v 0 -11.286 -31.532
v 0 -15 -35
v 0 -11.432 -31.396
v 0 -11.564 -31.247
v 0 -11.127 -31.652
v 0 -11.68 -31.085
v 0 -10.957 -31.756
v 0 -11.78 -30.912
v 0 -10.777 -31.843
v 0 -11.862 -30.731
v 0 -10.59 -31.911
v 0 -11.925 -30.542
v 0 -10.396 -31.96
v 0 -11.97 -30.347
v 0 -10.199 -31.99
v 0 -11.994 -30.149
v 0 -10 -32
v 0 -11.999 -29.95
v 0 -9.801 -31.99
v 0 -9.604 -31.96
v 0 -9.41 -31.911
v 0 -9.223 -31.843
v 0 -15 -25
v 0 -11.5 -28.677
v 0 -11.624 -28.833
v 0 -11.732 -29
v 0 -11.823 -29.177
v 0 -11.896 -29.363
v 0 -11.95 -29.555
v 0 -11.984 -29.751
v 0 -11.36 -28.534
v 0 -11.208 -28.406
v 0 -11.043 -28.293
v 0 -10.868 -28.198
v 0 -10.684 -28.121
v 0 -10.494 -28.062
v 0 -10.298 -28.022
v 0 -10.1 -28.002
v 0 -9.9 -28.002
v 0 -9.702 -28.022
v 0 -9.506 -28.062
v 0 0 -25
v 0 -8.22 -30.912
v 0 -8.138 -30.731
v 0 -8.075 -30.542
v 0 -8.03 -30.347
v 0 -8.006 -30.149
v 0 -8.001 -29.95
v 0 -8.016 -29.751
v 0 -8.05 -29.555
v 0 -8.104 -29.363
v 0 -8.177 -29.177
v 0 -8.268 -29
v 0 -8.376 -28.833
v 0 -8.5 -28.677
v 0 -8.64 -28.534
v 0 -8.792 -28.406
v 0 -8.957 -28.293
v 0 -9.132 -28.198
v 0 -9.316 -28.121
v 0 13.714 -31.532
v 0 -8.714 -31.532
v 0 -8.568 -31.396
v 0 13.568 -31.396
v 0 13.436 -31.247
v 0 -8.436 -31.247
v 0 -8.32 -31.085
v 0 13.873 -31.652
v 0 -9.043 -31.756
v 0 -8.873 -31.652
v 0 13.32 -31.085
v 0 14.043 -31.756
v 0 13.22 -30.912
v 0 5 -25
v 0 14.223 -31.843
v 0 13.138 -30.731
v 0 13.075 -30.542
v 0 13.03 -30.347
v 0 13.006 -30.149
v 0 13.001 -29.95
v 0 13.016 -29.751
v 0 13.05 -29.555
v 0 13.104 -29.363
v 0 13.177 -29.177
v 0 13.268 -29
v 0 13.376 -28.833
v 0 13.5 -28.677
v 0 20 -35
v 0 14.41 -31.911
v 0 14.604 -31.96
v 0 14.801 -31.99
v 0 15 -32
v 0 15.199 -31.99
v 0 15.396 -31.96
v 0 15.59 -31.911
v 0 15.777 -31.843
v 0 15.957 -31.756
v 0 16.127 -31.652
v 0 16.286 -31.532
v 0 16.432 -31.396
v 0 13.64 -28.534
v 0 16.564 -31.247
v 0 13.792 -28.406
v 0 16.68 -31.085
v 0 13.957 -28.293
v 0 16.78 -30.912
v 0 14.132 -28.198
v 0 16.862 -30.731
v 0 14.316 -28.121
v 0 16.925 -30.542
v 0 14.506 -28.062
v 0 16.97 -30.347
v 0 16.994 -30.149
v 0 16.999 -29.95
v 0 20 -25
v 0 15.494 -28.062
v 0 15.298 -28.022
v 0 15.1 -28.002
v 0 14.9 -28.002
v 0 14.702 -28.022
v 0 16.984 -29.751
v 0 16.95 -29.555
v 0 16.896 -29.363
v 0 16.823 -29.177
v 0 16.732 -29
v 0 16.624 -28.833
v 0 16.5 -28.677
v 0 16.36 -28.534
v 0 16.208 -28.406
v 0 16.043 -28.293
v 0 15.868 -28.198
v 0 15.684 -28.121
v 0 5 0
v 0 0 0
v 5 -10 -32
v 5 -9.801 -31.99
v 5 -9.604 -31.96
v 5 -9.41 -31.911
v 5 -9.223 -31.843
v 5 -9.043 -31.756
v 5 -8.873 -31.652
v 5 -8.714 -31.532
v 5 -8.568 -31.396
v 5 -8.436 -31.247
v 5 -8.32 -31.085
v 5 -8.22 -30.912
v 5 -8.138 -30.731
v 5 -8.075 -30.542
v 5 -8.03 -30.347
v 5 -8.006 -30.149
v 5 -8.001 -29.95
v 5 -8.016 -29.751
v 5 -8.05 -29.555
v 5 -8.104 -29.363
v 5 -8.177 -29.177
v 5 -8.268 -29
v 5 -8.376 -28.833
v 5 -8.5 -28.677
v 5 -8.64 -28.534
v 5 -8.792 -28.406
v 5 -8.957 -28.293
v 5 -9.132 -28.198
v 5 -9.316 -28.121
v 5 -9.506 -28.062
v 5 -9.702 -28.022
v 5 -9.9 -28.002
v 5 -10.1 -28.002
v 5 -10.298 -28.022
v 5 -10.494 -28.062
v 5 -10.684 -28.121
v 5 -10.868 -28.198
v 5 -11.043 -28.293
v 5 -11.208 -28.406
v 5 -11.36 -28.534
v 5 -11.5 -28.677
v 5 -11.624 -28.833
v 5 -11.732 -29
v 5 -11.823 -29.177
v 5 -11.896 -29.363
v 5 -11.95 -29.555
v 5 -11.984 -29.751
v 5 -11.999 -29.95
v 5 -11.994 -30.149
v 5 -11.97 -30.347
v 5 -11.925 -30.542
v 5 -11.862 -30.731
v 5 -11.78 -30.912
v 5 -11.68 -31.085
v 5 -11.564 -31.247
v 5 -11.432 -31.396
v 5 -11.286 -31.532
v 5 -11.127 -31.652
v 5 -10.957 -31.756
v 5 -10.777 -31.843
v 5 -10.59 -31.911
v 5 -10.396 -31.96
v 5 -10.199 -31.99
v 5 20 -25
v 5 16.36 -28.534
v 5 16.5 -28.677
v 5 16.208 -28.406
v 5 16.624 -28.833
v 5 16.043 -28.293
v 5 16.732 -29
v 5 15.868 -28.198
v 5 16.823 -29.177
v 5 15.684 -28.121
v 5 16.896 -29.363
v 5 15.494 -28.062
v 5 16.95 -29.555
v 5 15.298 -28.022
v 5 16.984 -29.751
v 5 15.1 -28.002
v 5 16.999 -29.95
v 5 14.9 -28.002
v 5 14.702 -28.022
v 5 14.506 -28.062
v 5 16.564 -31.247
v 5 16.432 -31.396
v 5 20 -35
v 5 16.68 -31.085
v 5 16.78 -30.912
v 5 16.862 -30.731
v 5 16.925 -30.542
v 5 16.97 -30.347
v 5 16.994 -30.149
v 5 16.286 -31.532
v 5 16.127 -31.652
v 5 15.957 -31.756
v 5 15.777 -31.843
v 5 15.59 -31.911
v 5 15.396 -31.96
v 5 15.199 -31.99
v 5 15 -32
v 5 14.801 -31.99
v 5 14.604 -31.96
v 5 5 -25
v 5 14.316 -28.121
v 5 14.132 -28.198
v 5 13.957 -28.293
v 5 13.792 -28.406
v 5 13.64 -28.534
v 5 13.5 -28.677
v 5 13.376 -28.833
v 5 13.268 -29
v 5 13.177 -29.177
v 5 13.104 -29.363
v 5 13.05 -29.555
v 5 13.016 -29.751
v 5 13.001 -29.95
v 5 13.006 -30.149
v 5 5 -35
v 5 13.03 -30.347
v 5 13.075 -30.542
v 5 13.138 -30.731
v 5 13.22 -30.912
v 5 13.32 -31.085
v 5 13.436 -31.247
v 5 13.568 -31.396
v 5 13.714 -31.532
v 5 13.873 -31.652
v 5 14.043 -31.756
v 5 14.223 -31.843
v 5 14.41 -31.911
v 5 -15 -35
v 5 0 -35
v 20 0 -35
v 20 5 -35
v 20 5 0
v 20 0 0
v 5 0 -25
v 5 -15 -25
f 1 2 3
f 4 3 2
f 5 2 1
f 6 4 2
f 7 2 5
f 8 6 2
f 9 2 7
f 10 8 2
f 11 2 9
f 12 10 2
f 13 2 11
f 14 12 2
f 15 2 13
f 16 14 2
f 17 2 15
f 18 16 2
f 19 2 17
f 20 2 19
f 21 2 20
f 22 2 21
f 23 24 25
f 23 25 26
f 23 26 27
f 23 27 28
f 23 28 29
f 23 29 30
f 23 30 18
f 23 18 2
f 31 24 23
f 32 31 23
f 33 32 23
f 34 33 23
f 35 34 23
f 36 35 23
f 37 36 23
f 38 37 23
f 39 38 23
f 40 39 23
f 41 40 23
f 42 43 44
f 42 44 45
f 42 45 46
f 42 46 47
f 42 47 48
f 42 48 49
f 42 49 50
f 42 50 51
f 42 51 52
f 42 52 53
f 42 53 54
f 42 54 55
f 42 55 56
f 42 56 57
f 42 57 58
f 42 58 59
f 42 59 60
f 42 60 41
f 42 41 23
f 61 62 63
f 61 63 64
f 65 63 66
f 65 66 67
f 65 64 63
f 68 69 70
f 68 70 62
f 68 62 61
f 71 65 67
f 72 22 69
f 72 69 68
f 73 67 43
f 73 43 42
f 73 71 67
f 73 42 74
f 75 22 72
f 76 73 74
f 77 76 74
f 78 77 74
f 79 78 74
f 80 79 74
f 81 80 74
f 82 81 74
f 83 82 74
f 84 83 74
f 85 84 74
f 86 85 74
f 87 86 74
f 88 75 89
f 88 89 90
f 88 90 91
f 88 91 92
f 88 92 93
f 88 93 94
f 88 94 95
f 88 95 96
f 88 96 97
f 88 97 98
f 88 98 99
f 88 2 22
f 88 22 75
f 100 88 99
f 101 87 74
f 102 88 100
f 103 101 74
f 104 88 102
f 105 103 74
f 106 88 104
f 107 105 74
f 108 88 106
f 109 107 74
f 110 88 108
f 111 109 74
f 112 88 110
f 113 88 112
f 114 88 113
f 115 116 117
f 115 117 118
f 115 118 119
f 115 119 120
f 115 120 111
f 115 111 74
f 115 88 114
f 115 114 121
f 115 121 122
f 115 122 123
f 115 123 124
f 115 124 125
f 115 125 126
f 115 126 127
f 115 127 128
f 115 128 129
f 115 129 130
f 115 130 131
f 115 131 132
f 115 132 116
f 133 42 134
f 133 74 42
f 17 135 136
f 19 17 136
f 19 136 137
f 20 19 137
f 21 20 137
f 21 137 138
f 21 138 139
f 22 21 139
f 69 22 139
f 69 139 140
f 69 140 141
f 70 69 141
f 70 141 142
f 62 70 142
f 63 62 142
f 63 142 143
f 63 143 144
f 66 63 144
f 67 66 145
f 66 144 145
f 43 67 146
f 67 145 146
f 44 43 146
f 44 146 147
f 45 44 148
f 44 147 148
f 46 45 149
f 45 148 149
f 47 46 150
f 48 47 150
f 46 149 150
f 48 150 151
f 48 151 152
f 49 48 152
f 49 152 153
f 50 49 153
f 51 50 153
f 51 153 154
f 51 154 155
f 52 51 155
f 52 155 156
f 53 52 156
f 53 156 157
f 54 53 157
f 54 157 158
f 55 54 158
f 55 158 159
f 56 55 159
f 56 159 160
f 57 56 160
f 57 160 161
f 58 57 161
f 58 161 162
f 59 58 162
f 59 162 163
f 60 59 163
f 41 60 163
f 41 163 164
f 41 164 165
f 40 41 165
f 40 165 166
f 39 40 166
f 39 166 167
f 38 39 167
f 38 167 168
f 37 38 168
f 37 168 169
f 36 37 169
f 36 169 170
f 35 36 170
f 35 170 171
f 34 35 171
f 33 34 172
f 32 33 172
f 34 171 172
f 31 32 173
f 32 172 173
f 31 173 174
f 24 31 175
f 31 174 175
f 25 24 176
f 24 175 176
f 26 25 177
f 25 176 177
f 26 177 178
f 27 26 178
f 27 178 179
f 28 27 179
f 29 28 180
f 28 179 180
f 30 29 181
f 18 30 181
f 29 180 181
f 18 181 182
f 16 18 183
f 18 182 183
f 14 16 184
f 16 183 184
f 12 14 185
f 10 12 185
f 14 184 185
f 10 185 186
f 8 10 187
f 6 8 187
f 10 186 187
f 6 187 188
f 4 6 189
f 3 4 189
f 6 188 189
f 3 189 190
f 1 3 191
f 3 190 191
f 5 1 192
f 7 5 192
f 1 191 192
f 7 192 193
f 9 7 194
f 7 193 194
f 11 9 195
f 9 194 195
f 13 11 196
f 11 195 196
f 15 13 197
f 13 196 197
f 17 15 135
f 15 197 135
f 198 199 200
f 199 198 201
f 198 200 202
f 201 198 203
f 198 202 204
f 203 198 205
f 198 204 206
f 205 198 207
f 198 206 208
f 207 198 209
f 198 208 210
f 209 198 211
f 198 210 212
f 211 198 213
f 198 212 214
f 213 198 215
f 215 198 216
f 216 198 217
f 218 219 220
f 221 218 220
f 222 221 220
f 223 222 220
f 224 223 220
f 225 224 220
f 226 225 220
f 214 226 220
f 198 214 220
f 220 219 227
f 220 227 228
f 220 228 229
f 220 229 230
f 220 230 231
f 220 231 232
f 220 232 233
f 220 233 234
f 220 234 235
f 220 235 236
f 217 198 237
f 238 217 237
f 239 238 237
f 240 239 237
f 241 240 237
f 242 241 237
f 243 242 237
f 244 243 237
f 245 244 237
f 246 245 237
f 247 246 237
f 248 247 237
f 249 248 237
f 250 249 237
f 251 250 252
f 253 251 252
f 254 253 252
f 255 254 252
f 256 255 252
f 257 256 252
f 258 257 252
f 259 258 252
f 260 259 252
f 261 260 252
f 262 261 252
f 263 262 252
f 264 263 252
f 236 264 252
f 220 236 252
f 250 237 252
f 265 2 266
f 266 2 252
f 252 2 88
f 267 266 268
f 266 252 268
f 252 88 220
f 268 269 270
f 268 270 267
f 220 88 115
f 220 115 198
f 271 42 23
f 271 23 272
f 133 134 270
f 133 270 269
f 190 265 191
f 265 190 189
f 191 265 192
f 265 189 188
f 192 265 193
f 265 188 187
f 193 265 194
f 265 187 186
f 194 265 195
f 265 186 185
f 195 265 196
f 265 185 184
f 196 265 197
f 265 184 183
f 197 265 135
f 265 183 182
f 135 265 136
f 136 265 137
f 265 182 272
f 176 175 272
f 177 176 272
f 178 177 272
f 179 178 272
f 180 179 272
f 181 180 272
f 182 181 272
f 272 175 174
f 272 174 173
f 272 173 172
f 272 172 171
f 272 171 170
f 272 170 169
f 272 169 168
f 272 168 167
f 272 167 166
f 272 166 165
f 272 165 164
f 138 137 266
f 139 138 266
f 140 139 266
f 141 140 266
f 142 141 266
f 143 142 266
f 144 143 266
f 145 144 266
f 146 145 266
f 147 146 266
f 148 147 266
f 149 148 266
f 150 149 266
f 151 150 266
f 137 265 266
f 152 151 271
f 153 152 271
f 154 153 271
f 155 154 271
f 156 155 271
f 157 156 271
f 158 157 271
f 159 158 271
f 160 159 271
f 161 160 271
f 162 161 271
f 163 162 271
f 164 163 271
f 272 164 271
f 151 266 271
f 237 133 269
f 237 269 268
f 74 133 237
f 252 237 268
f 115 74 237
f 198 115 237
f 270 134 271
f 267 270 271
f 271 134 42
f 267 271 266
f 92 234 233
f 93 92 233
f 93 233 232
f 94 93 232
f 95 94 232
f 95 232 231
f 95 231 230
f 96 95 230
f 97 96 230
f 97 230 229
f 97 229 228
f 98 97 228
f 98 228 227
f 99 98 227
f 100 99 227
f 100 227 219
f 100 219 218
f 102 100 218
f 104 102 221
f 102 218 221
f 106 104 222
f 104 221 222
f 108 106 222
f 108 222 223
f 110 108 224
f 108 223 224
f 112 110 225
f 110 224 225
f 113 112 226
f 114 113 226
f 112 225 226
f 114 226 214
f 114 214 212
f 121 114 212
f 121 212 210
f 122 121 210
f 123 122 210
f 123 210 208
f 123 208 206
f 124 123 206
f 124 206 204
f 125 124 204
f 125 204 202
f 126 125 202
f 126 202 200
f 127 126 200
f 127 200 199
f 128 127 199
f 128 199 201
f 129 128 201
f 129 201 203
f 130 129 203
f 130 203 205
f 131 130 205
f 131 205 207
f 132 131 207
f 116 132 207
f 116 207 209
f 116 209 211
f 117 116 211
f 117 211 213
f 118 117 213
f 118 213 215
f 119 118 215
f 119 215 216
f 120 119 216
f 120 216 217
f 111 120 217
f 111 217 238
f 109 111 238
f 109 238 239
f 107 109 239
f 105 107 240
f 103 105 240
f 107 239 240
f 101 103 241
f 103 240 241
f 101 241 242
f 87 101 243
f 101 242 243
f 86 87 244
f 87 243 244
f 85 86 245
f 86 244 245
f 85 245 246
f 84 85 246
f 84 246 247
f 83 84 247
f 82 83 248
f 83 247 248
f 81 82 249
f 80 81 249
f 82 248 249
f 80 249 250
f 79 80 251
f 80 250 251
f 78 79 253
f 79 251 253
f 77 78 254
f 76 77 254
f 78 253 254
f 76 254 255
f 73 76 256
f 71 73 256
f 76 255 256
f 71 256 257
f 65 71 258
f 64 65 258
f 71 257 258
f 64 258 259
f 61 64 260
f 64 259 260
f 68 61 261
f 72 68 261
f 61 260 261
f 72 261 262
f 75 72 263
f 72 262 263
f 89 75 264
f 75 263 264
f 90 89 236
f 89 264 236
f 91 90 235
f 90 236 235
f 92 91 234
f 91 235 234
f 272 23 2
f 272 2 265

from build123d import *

# Parameters (mm, degrees)
SKETCH1_W           = 35
SKETCH1_H           = 5
BOSS_EXTRUDE1_DEPTH = 20
SKETCH2_W           = 5
SKETCH2_H           = 10
BOSS_EXTRUDE2_DEPTH = 15
SKETCH3_W           = 5
SKETCH3_H           = 10
BOSS_EXTRUDE3_DEPTH = 15
SKETCH4_R           = 2
CUT_EXTRUDE1_DEPTH  = 15


with BuildPart() as part:
    # Sketch1 → Boss-Extrude1 (new body)
    with BuildSketch(Plane(origin=(0, 0, 0), x_dir=(0, 0, -1), z_dir=(1, 0, 0))):
        with Locations((17.5, 2.5)):
            Rectangle(SKETCH1_W, SKETCH1_H)
    extrude(amount=BOSS_EXTRUDE1_DEPTH)

    # Sketch2 → Boss-Extrude2 (add)
    with BuildSketch(Plane(origin=(0, 5, 0), x_dir=(1, 0, 0), z_dir=(0, 1, 0))):
        with Locations((2.5, 30)):
            Rectangle(SKETCH2_W, SKETCH2_H)
    extrude(amount=BOSS_EXTRUDE2_DEPTH)

    # Sketch3 → Boss-Extrude3 (add)
    with BuildSketch(Plane.XZ):
        with Locations((2.5, -30)):
            Rectangle(SKETCH3_W, SKETCH3_H)
    extrude(amount=BOSS_EXTRUDE3_DEPTH)

    # Sketch4 → Cut-Extrude1 (cut)
    with BuildSketch(Plane(origin=(5, 0, 0), x_dir=(0, 0, -1), z_dir=(1, 0, 0))):
        with Locations((30, 15)):
            Circle(SKETCH4_R)
        with Locations((30, -10)):
            Circle(SKETCH4_R)
    extrude(amount=-CUT_EXTRUDE1_DEPTH, mode=Mode.SUBTRACT)


solid = part.part
